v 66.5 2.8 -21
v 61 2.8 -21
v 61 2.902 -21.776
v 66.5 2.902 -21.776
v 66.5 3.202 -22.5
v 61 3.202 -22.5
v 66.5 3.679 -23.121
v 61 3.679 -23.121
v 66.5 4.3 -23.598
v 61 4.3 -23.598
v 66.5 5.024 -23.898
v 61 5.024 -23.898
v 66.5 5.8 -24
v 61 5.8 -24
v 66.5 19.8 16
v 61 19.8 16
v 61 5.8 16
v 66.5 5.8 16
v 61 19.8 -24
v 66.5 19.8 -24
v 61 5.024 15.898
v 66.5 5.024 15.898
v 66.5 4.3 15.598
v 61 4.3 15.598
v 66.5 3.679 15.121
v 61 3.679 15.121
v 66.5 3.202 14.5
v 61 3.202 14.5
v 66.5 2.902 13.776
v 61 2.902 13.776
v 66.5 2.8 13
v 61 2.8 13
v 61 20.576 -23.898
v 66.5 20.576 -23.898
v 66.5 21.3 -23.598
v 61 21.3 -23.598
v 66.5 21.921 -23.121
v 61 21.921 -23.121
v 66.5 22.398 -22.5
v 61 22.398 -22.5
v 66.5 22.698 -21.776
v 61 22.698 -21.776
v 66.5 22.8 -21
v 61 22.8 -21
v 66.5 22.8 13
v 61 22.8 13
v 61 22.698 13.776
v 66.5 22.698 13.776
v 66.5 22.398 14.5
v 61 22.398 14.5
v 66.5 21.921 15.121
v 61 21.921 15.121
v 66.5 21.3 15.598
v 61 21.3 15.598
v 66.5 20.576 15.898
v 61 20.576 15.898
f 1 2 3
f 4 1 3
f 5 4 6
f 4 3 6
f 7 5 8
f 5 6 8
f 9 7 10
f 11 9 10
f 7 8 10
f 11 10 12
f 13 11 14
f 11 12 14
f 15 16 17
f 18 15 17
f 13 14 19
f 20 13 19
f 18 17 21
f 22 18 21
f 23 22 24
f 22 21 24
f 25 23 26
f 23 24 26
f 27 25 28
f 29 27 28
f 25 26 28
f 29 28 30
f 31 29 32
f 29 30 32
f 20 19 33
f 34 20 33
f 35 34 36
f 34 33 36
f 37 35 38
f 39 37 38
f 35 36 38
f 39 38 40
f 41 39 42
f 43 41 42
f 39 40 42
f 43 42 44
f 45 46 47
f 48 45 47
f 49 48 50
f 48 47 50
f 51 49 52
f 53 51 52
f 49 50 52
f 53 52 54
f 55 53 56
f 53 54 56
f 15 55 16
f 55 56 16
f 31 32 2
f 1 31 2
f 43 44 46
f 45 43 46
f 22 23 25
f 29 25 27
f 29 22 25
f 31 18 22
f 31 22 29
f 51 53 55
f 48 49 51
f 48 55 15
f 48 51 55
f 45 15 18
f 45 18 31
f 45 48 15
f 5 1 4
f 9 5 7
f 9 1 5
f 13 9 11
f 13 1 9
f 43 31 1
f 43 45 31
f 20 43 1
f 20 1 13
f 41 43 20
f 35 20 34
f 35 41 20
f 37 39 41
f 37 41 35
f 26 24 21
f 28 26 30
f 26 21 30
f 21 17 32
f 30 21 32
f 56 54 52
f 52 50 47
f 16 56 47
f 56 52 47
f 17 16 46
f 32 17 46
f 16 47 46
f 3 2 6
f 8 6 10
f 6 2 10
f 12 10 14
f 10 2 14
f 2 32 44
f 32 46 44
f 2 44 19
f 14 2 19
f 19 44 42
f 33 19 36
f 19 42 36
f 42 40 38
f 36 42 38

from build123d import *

# Parameters (mm, degrees)
DRIVER_START = 61
DRIVER_DEPTH = 5.5


with BuildPart() as part:
    # Sketch1 → Driver (new body)
    with BuildSketch(Plane(origin=(0, 0, 0), x_dir=(0, 0, -1), z_dir=(1, 0, 0)).offset(DRIVER_START)):
        with BuildLine():
            Line((24, 5.8), (24, 19.8))
            ThreePointArc((24, 19.8), (23.121320344, 21.921320344), (21, 22.8))
            Line((21, 22.8), (-13, 22.8))
            ThreePointArc((-13, 22.8), (-15.121320344, 21.921320344), (-16, 19.8))
            Line((-16, 19.8), (-16, 5.8))
            ThreePointArc((-16, 5.8), (-15.121320344, 3.678679656), (-13, 2.8))
            Line((-13, 2.8), (21, 2.8))
            ThreePointArc((21, 2.8), (23.121320344, 3.678679656), (24, 5.8))
        make_face()
    extrude(amount=DRIVER_DEPTH)


solid = part.part
